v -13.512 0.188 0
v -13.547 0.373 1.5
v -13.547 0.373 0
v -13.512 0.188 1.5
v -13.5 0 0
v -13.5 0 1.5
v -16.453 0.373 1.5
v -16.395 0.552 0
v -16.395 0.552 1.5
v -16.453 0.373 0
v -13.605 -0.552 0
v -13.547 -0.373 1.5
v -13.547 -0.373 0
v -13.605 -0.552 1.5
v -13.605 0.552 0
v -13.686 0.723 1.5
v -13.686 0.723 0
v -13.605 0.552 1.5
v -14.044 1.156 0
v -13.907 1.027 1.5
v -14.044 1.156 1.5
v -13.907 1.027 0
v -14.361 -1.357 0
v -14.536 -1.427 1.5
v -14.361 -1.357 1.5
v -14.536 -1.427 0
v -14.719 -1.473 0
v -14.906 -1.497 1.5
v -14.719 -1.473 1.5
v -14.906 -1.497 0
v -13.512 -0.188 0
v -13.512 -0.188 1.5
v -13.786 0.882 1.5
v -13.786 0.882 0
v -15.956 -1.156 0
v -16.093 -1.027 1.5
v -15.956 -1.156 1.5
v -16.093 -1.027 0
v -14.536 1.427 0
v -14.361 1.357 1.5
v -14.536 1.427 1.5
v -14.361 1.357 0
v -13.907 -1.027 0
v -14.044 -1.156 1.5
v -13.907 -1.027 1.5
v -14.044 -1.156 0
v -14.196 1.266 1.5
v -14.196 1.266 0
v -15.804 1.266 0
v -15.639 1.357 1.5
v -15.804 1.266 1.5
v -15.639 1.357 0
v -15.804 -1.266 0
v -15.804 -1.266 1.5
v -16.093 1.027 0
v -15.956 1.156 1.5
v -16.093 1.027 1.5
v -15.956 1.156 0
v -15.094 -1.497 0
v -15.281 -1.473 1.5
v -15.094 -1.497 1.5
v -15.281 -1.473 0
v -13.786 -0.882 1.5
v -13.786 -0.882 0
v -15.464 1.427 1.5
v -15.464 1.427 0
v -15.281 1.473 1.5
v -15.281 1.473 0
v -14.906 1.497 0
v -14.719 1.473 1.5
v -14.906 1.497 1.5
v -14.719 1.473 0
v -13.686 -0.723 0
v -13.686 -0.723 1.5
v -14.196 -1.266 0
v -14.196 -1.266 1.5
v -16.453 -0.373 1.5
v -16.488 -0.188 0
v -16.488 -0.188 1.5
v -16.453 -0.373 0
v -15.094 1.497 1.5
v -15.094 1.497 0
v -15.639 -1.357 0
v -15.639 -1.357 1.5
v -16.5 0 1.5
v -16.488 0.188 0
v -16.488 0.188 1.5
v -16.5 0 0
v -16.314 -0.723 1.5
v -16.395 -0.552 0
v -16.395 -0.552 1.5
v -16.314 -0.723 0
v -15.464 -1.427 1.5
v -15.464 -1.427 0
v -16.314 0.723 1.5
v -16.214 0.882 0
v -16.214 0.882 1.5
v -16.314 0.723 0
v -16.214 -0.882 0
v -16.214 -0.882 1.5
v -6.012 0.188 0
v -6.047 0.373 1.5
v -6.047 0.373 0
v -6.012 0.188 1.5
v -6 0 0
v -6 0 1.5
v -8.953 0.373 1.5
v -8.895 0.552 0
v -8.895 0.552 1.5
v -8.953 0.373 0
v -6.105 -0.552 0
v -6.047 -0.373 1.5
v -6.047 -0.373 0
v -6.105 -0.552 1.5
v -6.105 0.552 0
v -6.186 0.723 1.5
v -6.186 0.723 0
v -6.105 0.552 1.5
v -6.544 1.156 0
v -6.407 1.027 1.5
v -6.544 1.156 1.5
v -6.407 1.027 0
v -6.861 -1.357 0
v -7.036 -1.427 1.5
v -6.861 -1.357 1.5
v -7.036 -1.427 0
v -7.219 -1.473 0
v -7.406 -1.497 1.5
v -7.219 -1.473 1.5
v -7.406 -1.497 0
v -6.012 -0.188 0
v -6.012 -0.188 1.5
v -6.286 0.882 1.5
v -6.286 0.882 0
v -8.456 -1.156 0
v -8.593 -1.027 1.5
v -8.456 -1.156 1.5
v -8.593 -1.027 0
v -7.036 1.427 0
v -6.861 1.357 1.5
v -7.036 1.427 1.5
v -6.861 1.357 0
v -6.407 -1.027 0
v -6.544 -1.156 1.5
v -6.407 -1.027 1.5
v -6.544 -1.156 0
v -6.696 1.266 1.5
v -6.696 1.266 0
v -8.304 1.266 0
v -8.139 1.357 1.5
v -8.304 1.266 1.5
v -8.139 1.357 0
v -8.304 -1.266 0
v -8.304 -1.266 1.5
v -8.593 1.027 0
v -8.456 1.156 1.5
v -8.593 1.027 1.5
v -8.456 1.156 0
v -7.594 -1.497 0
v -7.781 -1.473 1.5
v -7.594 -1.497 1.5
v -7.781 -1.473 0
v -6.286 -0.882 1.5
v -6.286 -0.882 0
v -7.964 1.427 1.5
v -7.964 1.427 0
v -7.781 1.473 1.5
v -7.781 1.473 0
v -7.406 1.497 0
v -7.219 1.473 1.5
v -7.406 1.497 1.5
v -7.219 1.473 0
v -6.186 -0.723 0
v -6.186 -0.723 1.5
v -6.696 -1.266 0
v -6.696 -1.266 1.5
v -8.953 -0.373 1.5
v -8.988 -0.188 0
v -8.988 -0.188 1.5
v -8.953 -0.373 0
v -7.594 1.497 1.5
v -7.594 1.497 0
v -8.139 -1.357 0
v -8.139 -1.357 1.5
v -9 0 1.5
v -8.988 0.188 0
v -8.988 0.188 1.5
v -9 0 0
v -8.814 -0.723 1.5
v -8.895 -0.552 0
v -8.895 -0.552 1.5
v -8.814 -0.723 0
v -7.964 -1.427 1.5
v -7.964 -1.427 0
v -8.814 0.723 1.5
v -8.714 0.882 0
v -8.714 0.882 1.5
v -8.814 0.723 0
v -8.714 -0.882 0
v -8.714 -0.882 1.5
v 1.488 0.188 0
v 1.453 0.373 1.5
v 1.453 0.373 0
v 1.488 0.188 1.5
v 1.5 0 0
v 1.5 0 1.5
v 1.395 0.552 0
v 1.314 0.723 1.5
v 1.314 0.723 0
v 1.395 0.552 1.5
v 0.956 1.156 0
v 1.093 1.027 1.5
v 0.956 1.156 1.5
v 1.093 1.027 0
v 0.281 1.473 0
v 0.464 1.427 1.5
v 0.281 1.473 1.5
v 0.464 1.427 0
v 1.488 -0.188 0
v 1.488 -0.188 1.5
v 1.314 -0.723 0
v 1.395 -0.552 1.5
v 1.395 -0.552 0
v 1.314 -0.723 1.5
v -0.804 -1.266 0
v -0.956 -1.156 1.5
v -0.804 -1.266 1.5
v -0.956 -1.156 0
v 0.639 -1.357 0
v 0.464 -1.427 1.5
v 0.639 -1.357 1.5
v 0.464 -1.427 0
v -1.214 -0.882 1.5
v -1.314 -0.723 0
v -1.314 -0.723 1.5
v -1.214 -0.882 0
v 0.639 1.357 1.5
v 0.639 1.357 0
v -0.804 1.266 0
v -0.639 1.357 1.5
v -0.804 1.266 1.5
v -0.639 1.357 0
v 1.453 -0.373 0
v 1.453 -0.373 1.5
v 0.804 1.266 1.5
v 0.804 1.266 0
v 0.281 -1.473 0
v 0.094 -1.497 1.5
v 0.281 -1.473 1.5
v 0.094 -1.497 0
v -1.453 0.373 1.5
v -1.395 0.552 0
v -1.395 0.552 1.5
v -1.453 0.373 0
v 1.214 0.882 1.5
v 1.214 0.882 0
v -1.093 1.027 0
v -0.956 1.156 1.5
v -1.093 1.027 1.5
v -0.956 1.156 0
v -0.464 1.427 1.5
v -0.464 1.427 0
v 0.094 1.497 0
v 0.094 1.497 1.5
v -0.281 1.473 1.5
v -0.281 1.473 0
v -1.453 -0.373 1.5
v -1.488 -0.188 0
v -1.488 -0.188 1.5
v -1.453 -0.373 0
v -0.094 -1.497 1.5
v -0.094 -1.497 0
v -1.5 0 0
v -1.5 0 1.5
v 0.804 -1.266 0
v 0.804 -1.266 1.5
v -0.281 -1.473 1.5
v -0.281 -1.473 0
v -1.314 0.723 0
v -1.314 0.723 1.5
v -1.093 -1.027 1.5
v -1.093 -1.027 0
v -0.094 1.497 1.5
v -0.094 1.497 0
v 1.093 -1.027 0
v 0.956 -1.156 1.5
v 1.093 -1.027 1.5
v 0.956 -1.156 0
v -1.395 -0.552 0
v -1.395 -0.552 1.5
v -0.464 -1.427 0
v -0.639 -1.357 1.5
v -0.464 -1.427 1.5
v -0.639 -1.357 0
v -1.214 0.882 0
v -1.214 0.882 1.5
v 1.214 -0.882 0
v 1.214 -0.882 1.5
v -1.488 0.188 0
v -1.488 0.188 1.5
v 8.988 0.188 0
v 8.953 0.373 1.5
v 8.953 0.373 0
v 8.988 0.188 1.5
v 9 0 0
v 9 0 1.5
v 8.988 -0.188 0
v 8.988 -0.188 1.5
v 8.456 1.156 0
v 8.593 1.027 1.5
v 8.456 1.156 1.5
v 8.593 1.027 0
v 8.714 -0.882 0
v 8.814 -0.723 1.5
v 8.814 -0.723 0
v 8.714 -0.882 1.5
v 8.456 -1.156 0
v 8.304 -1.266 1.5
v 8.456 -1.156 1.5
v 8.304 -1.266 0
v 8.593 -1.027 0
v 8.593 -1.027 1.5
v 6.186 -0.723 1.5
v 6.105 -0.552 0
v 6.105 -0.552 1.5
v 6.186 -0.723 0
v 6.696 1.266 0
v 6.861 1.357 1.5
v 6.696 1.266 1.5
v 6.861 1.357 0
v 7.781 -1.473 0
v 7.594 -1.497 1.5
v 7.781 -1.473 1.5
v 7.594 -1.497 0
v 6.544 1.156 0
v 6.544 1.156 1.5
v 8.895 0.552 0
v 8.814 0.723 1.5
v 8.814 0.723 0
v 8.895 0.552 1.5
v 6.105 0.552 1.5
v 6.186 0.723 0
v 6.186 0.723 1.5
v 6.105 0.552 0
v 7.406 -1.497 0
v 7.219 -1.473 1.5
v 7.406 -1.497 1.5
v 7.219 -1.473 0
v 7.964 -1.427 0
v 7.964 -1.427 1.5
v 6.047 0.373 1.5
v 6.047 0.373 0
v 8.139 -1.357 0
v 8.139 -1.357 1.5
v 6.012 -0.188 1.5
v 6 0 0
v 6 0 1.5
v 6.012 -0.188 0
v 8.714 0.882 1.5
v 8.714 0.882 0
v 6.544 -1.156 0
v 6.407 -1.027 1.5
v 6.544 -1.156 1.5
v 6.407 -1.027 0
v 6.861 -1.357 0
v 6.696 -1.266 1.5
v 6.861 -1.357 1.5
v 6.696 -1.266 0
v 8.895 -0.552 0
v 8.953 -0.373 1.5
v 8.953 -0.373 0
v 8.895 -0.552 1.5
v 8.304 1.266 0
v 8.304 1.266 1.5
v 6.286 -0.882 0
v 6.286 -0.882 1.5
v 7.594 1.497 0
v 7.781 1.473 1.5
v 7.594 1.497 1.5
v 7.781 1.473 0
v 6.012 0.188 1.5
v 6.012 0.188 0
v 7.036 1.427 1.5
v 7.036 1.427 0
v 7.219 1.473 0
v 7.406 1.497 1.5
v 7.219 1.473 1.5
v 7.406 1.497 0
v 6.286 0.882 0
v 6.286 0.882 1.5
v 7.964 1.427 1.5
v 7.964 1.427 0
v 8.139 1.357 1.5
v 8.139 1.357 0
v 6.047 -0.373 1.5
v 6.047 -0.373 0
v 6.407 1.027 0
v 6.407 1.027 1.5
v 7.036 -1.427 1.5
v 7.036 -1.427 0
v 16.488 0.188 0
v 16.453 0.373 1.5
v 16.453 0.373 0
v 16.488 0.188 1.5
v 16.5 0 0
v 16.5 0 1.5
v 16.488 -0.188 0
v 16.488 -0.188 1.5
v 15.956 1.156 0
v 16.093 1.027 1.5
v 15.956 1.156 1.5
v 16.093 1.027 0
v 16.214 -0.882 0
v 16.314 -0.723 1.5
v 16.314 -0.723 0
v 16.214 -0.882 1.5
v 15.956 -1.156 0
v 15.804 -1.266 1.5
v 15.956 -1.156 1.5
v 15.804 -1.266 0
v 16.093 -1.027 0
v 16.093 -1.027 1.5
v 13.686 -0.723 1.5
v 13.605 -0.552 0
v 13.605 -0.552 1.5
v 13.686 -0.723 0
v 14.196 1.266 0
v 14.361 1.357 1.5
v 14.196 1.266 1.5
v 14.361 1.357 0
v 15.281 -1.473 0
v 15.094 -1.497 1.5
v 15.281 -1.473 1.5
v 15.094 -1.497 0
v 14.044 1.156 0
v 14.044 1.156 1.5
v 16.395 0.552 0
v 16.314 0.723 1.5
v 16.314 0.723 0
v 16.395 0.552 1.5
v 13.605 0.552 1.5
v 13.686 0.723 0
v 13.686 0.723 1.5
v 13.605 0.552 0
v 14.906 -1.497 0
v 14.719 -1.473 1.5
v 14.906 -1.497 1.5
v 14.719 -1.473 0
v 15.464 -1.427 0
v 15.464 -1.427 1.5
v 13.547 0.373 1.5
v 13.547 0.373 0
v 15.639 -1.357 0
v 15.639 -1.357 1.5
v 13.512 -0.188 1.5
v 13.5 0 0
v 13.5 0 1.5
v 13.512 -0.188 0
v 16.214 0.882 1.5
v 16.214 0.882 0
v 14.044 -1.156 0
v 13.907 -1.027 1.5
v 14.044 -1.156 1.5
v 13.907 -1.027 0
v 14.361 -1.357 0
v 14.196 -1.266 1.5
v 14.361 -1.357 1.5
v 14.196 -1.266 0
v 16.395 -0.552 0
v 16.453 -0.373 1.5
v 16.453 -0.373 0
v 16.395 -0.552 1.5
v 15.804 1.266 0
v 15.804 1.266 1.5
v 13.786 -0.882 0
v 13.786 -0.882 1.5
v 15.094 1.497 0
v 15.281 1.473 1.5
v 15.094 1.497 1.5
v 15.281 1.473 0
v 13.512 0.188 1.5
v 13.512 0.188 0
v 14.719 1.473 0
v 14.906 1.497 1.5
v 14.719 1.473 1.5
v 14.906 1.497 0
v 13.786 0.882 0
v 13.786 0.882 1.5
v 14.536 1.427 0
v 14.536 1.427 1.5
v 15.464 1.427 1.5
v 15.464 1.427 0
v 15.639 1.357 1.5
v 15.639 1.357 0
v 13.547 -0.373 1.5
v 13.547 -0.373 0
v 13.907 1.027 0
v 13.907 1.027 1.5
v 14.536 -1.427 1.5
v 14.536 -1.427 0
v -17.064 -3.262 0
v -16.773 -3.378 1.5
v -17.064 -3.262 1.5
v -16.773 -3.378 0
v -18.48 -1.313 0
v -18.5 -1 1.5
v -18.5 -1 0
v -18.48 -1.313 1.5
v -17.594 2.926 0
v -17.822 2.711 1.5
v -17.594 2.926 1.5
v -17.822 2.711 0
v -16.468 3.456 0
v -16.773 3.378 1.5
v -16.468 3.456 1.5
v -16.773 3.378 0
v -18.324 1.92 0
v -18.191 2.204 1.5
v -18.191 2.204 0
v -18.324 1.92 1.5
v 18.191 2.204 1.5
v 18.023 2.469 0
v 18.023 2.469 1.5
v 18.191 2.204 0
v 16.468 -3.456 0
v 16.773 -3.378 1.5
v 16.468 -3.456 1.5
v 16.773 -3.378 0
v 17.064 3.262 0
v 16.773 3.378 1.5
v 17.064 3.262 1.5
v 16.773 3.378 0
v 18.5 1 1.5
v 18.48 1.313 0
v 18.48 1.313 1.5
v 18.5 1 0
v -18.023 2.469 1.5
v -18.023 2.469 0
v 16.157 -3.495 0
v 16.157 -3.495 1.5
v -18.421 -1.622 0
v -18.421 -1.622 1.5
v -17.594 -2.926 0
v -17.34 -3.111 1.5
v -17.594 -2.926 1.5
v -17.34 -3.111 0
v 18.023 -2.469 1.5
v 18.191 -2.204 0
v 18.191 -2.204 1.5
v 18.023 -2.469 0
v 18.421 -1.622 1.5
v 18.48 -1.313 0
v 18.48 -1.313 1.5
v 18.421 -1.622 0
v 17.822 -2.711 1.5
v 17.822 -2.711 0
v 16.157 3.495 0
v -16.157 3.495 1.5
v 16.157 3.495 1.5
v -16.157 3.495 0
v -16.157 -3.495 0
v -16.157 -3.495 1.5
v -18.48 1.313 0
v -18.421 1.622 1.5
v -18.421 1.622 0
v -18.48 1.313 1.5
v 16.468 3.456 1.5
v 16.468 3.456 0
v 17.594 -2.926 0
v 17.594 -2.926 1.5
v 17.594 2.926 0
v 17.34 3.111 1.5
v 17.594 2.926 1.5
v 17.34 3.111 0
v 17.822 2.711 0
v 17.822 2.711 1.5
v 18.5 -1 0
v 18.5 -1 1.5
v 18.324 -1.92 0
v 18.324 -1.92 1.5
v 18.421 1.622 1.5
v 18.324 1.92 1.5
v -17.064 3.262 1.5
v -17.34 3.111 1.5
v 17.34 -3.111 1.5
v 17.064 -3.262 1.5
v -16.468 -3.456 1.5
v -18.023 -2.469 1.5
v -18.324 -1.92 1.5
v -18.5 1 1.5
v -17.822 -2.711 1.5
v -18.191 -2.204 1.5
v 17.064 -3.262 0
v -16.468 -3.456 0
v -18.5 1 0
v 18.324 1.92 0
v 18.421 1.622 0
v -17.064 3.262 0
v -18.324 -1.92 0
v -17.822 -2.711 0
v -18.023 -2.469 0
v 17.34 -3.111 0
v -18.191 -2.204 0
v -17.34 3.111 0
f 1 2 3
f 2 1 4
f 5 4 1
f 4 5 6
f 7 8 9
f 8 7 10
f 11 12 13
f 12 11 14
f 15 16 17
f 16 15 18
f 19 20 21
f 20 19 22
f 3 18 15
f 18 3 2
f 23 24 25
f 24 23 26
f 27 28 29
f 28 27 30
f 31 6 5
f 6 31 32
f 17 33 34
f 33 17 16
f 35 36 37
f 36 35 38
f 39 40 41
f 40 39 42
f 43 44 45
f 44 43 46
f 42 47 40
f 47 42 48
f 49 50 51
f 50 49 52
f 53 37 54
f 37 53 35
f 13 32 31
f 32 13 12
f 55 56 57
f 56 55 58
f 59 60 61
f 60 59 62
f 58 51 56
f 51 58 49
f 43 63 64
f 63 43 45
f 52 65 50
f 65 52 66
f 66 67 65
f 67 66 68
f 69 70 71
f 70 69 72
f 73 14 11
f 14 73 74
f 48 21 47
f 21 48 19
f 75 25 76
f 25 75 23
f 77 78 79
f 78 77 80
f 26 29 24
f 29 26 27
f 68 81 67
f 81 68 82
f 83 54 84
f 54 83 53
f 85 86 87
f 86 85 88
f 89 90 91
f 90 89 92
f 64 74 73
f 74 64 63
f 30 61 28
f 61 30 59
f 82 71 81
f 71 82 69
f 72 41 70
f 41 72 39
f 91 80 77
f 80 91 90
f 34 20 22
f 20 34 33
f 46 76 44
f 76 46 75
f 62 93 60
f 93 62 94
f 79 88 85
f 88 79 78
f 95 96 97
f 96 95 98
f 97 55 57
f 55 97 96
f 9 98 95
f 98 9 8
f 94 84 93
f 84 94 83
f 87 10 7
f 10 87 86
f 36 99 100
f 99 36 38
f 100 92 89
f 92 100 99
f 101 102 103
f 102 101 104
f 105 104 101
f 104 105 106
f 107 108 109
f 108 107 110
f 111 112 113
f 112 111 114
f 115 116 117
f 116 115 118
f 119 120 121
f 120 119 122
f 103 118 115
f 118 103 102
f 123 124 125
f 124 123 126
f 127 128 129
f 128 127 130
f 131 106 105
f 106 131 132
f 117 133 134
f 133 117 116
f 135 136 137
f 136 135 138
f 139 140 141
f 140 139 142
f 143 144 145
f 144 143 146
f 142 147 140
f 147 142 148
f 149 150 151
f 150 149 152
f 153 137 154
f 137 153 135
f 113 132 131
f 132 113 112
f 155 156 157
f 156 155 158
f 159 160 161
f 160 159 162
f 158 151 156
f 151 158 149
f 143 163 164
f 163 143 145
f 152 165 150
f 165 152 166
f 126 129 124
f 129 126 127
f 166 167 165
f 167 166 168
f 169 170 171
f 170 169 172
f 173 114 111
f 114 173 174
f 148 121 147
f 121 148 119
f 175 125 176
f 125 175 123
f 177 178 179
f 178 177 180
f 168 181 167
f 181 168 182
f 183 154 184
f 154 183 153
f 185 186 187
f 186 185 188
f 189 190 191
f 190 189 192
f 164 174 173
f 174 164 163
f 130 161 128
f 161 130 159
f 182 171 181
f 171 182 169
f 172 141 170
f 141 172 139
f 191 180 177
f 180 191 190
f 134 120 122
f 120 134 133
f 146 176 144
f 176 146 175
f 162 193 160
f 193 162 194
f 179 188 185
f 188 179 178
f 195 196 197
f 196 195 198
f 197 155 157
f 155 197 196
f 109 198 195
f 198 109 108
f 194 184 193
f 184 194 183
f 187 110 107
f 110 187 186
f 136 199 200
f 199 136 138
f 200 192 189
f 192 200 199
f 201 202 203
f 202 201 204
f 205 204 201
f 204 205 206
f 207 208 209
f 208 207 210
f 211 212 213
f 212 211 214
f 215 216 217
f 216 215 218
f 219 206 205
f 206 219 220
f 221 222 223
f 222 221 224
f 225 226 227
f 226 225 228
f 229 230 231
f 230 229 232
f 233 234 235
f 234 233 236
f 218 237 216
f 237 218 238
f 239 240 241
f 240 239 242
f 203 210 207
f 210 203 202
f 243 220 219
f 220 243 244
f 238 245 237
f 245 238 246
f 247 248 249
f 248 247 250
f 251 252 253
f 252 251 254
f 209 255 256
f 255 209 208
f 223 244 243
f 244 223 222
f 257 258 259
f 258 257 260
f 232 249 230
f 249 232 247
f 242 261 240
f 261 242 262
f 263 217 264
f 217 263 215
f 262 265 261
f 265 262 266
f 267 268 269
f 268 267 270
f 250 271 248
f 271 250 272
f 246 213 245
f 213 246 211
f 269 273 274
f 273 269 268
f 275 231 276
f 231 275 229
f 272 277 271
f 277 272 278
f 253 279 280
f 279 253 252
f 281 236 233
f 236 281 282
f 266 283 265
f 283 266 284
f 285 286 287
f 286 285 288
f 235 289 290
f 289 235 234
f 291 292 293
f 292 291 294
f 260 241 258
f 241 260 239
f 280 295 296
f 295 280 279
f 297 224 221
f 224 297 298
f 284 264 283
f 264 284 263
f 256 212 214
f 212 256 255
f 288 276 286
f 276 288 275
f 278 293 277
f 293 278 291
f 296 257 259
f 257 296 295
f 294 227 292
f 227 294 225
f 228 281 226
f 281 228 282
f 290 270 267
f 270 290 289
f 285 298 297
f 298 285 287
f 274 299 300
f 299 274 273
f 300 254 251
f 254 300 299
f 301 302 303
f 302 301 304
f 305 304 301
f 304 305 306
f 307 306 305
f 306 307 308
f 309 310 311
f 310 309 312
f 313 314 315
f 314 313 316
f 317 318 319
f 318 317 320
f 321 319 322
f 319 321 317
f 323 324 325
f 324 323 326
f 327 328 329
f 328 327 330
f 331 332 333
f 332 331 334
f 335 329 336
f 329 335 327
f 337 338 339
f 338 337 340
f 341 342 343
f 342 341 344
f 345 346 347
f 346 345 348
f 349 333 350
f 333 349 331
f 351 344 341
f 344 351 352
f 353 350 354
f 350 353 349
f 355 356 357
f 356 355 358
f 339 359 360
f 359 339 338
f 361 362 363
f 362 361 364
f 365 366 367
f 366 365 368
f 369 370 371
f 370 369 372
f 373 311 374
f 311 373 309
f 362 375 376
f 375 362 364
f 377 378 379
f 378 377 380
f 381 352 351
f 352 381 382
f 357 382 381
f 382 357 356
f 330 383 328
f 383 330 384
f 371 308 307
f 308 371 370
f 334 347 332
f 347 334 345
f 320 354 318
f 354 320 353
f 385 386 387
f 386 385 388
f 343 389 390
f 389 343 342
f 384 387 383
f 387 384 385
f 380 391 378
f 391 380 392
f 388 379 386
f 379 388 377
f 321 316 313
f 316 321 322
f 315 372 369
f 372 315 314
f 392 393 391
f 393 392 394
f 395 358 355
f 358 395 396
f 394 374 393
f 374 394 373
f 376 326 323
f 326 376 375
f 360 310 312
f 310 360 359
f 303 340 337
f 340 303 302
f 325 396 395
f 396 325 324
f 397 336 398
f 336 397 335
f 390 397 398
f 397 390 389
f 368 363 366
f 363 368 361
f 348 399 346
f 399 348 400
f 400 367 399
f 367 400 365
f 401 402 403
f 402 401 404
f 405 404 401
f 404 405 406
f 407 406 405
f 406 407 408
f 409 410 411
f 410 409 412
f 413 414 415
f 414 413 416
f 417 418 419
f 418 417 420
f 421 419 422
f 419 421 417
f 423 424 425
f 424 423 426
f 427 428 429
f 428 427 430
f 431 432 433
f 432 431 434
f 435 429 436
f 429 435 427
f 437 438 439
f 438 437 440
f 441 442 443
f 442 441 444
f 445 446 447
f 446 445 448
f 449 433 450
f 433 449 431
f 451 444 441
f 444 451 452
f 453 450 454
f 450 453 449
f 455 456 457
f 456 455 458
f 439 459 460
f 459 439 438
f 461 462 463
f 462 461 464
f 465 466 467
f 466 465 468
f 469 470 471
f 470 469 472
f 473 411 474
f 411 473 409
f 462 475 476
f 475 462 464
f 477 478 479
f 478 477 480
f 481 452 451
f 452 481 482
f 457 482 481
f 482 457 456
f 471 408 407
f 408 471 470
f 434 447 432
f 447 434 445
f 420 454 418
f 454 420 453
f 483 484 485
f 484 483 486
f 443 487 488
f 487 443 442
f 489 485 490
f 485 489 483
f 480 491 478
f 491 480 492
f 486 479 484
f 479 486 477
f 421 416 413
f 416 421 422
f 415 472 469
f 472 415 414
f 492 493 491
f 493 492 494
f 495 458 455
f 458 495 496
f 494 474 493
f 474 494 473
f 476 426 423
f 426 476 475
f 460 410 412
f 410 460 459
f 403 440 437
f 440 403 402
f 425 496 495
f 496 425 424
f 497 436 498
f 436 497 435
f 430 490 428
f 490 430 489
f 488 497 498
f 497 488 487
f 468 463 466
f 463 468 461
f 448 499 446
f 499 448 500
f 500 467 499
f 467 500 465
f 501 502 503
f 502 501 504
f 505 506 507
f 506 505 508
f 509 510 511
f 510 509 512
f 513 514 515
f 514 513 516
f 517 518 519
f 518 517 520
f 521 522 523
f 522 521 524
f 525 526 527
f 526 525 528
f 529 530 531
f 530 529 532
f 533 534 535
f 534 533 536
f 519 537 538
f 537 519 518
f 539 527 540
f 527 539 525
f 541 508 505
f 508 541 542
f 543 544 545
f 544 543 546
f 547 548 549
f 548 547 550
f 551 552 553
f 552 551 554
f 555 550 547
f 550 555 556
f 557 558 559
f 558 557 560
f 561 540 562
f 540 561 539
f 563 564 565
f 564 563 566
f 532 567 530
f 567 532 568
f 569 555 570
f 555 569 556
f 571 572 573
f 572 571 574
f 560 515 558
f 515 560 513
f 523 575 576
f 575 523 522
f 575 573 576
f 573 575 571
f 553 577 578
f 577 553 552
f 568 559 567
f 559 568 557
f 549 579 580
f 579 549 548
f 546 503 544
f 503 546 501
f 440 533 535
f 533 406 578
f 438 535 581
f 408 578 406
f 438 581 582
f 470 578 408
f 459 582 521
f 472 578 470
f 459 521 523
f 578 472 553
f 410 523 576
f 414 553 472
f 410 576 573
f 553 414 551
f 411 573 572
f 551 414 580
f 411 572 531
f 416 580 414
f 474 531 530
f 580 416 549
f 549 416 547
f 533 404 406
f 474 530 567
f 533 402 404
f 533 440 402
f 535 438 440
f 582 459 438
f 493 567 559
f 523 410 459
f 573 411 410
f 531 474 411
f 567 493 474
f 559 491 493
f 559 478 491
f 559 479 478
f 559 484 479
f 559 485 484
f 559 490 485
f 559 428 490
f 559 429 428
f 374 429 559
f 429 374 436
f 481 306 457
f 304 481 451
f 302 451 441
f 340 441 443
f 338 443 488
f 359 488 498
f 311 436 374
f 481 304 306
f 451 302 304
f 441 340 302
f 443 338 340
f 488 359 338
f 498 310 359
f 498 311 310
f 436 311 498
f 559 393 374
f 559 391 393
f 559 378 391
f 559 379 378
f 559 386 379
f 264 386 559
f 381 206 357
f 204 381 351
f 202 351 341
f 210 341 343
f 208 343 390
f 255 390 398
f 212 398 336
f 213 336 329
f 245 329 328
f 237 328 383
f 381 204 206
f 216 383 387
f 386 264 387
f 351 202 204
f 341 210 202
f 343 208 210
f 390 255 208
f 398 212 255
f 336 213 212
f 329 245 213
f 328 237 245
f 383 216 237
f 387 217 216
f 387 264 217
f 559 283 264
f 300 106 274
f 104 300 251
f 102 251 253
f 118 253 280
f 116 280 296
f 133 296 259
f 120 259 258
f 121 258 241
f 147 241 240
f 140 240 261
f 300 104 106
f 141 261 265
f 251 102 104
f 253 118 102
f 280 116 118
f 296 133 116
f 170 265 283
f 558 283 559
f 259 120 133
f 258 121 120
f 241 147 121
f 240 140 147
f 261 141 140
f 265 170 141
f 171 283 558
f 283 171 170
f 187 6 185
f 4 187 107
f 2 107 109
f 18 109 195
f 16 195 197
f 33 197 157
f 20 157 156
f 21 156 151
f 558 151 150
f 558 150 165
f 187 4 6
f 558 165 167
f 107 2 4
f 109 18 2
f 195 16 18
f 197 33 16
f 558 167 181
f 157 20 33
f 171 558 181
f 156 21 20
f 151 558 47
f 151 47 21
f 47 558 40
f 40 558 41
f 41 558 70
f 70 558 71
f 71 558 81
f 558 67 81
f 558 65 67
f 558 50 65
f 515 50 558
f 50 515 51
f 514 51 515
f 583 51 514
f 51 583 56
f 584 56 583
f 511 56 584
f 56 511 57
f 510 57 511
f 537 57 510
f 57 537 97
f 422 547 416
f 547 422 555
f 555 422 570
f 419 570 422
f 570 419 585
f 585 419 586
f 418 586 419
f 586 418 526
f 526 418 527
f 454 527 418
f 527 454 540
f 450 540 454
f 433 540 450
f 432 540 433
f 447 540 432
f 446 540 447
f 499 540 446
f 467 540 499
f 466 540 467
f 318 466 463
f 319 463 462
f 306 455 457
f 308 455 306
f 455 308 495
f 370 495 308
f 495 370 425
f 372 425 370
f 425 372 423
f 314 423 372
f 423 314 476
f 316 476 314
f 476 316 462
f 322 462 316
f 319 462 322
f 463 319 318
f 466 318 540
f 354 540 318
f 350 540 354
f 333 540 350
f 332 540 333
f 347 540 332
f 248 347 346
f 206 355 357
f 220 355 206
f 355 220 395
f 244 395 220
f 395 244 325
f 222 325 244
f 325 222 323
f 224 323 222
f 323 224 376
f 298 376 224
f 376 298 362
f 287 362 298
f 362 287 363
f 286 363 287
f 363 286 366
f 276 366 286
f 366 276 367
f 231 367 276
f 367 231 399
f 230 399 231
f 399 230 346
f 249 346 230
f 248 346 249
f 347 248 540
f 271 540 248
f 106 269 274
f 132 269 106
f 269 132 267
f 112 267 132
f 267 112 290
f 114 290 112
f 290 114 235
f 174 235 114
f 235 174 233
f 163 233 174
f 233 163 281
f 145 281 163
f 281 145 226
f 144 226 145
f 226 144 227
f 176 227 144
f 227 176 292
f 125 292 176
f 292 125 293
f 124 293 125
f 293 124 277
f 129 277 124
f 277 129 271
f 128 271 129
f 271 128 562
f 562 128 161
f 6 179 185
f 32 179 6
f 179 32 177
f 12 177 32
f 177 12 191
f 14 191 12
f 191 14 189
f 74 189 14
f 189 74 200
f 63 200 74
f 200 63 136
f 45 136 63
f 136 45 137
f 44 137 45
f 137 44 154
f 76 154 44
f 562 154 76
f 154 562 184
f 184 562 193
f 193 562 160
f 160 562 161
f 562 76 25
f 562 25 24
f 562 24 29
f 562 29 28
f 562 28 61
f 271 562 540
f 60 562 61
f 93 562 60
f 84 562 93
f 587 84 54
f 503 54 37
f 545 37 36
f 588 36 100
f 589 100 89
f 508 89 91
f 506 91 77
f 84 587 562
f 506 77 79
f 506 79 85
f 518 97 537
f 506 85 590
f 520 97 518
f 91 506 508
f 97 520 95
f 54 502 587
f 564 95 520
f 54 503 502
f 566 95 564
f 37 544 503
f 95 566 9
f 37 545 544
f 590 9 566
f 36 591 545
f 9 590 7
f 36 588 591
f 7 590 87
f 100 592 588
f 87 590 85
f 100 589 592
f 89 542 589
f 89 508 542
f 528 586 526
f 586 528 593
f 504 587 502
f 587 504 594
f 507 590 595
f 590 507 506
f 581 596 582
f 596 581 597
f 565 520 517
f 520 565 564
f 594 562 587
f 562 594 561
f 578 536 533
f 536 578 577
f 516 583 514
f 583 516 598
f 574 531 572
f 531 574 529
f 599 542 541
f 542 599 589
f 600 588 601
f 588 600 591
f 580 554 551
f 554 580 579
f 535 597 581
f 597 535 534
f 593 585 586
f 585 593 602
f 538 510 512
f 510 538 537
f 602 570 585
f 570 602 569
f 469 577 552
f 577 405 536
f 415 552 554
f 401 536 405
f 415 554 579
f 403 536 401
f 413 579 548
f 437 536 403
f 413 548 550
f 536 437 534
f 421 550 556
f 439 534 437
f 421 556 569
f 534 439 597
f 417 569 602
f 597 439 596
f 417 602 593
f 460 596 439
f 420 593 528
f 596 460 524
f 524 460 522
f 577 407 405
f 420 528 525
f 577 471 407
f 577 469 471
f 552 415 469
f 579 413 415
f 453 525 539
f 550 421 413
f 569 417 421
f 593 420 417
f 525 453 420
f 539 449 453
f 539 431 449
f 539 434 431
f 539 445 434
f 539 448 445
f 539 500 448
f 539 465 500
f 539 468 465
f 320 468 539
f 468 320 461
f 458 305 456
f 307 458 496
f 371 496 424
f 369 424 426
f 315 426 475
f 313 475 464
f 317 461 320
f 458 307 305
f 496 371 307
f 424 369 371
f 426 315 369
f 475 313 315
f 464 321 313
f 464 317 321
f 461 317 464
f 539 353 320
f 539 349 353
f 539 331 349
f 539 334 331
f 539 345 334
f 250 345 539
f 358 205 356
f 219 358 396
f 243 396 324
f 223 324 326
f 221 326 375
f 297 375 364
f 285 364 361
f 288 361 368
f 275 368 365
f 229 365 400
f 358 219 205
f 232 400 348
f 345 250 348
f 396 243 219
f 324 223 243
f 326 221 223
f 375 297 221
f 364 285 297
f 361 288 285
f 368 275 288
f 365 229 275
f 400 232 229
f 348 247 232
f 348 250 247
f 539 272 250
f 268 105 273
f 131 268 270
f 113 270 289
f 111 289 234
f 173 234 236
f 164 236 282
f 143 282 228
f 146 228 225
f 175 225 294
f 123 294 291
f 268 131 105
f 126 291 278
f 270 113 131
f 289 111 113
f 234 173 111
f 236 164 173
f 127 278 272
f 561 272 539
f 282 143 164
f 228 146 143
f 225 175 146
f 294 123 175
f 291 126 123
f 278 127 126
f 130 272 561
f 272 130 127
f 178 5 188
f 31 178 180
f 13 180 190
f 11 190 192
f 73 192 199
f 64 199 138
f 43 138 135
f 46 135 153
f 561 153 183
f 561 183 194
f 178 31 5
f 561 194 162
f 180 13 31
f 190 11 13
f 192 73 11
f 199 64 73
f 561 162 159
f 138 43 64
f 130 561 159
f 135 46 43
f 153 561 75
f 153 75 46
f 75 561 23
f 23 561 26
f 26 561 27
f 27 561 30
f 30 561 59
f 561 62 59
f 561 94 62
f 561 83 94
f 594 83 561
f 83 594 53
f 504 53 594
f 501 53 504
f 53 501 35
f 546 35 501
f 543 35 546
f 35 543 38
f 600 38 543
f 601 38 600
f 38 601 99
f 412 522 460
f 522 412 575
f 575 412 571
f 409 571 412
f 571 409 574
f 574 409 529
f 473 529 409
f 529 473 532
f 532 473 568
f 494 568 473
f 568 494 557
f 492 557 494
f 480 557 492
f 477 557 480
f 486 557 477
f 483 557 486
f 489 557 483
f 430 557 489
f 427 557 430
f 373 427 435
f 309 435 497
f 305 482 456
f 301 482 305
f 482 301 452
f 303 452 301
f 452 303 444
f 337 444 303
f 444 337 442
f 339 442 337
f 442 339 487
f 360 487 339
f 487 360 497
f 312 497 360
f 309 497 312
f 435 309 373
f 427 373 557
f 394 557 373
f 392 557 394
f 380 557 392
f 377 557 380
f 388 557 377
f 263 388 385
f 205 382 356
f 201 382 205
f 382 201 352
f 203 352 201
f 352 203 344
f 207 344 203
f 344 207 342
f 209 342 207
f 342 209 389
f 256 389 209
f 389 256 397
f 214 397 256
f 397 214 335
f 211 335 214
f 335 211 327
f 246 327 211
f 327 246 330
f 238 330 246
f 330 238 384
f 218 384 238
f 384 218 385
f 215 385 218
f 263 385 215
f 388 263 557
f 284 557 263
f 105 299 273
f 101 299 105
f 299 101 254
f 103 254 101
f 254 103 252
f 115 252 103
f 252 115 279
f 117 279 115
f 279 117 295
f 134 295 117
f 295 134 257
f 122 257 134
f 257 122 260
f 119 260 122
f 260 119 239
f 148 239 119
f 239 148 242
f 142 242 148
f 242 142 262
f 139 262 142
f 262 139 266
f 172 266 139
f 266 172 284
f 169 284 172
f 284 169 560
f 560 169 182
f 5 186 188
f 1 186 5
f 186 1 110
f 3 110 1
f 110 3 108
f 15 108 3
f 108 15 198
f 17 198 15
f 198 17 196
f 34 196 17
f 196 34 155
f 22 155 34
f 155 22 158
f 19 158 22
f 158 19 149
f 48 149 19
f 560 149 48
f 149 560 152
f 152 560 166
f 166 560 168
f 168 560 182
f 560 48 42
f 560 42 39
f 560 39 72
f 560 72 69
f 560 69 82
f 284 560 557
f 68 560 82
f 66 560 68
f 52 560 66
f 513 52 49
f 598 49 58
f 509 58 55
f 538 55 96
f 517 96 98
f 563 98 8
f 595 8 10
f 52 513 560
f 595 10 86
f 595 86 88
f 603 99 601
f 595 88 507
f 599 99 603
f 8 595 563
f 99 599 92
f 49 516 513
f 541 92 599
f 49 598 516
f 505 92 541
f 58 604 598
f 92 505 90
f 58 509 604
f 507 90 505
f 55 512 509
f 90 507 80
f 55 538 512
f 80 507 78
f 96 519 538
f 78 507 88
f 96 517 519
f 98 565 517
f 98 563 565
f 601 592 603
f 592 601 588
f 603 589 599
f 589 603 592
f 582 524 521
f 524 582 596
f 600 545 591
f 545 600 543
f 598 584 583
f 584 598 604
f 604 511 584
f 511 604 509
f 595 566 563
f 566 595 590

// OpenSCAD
$fn = 50;


difference() {
	union() {
		translate(v = [0, 0, 0]) {
			rotate(a = [0, 0, 0]) {
				hull() {
					translate(v = [-16.0000000000, 1.0000000000, 0]) {
						rotate(a = [0, 0, 0]) {
							translate(v = [0, 0, 0]) {
								rotate(a = [0, 0, 0]) {
									cylinder(h = 1.5000000000, r = 2.5000000000);
								}
							}
						}
					}
					translate(v = [16.0000000000, 1.0000000000, 0]) {
						rotate(a = [0, 0, 0]) {
							translate(v = [0, 0, 0]) {
								rotate(a = [0, 0, 0]) {
									cylinder(h = 1.5000000000, r = 2.5000000000);
								}
							}
						}
					}
					translate(v = [-16.0000000000, -1.0000000000, 0]) {
						rotate(a = [0, 0, 0]) {
							translate(v = [0, 0, 0]) {
								rotate(a = [0, 0, 0]) {
									cylinder(h = 1.5000000000, r = 2.5000000000);
								}
							}
						}
					}
					translate(v = [16.0000000000, -1.0000000000, 0]) {
						rotate(a = [0, 0, 0]) {
							translate(v = [0, 0, 0]) {
								rotate(a = [0, 0, 0]) {
									cylinder(h = 1.5000000000, r = 2.5000000000);
								}
							}
						}
					}
				}
			}
		}
	}
	union() {
		translate(v = [-15.0000000000, 0.0000000000, 0]) {
			rotate(a = [0, 0, 0]) {
				translate(v = [0, 0, -50]) {
					rotate(a = [0, 0, 0]) {
						cylinder(h = 100, r = 1.5000000000);
					}
				}
			}
		}
		translate(v = [-7.5000000000, 0.0000000000, 0]) {
			rotate(a = [0, 0, 0]) {
				translate(v = [0, 0, -50]) {
					rotate(a = [0, 0, 0]) {
						cylinder(h = 100, r = 1.5000000000);
					}
				}
			}
		}
		translate(v = [0.0000000000, 0.0000000000, 0]) {
			rotate(a = [0, 0, 0]) {
				translate(v = [0, 0, -50]) {
					rotate(a = [0, 0, 0]) {
						cylinder(h = 100, r = 1.5000000000);
					}
				}
			}
		}
		translate(v = [7.5000000000, 0.0000000000, 0]) {
			rotate(a = [0, 0, 0]) {
				translate(v = [0, 0, -50]) {
					rotate(a = [0, 0, 0]) {
						cylinder(h = 100, r = 1.5000000000);
					}
				}
			}
		}
		translate(v = [15.0000000000, 0.0000000000, 0]) {
			rotate(a = [0, 0, 0]) {
				translate(v = [0, 0, -50]) {
					rotate(a = [0, 0, 0]) {
						cylinder(h = 100, r = 1.5000000000);
					}
				}
			}
		}
	}
}
